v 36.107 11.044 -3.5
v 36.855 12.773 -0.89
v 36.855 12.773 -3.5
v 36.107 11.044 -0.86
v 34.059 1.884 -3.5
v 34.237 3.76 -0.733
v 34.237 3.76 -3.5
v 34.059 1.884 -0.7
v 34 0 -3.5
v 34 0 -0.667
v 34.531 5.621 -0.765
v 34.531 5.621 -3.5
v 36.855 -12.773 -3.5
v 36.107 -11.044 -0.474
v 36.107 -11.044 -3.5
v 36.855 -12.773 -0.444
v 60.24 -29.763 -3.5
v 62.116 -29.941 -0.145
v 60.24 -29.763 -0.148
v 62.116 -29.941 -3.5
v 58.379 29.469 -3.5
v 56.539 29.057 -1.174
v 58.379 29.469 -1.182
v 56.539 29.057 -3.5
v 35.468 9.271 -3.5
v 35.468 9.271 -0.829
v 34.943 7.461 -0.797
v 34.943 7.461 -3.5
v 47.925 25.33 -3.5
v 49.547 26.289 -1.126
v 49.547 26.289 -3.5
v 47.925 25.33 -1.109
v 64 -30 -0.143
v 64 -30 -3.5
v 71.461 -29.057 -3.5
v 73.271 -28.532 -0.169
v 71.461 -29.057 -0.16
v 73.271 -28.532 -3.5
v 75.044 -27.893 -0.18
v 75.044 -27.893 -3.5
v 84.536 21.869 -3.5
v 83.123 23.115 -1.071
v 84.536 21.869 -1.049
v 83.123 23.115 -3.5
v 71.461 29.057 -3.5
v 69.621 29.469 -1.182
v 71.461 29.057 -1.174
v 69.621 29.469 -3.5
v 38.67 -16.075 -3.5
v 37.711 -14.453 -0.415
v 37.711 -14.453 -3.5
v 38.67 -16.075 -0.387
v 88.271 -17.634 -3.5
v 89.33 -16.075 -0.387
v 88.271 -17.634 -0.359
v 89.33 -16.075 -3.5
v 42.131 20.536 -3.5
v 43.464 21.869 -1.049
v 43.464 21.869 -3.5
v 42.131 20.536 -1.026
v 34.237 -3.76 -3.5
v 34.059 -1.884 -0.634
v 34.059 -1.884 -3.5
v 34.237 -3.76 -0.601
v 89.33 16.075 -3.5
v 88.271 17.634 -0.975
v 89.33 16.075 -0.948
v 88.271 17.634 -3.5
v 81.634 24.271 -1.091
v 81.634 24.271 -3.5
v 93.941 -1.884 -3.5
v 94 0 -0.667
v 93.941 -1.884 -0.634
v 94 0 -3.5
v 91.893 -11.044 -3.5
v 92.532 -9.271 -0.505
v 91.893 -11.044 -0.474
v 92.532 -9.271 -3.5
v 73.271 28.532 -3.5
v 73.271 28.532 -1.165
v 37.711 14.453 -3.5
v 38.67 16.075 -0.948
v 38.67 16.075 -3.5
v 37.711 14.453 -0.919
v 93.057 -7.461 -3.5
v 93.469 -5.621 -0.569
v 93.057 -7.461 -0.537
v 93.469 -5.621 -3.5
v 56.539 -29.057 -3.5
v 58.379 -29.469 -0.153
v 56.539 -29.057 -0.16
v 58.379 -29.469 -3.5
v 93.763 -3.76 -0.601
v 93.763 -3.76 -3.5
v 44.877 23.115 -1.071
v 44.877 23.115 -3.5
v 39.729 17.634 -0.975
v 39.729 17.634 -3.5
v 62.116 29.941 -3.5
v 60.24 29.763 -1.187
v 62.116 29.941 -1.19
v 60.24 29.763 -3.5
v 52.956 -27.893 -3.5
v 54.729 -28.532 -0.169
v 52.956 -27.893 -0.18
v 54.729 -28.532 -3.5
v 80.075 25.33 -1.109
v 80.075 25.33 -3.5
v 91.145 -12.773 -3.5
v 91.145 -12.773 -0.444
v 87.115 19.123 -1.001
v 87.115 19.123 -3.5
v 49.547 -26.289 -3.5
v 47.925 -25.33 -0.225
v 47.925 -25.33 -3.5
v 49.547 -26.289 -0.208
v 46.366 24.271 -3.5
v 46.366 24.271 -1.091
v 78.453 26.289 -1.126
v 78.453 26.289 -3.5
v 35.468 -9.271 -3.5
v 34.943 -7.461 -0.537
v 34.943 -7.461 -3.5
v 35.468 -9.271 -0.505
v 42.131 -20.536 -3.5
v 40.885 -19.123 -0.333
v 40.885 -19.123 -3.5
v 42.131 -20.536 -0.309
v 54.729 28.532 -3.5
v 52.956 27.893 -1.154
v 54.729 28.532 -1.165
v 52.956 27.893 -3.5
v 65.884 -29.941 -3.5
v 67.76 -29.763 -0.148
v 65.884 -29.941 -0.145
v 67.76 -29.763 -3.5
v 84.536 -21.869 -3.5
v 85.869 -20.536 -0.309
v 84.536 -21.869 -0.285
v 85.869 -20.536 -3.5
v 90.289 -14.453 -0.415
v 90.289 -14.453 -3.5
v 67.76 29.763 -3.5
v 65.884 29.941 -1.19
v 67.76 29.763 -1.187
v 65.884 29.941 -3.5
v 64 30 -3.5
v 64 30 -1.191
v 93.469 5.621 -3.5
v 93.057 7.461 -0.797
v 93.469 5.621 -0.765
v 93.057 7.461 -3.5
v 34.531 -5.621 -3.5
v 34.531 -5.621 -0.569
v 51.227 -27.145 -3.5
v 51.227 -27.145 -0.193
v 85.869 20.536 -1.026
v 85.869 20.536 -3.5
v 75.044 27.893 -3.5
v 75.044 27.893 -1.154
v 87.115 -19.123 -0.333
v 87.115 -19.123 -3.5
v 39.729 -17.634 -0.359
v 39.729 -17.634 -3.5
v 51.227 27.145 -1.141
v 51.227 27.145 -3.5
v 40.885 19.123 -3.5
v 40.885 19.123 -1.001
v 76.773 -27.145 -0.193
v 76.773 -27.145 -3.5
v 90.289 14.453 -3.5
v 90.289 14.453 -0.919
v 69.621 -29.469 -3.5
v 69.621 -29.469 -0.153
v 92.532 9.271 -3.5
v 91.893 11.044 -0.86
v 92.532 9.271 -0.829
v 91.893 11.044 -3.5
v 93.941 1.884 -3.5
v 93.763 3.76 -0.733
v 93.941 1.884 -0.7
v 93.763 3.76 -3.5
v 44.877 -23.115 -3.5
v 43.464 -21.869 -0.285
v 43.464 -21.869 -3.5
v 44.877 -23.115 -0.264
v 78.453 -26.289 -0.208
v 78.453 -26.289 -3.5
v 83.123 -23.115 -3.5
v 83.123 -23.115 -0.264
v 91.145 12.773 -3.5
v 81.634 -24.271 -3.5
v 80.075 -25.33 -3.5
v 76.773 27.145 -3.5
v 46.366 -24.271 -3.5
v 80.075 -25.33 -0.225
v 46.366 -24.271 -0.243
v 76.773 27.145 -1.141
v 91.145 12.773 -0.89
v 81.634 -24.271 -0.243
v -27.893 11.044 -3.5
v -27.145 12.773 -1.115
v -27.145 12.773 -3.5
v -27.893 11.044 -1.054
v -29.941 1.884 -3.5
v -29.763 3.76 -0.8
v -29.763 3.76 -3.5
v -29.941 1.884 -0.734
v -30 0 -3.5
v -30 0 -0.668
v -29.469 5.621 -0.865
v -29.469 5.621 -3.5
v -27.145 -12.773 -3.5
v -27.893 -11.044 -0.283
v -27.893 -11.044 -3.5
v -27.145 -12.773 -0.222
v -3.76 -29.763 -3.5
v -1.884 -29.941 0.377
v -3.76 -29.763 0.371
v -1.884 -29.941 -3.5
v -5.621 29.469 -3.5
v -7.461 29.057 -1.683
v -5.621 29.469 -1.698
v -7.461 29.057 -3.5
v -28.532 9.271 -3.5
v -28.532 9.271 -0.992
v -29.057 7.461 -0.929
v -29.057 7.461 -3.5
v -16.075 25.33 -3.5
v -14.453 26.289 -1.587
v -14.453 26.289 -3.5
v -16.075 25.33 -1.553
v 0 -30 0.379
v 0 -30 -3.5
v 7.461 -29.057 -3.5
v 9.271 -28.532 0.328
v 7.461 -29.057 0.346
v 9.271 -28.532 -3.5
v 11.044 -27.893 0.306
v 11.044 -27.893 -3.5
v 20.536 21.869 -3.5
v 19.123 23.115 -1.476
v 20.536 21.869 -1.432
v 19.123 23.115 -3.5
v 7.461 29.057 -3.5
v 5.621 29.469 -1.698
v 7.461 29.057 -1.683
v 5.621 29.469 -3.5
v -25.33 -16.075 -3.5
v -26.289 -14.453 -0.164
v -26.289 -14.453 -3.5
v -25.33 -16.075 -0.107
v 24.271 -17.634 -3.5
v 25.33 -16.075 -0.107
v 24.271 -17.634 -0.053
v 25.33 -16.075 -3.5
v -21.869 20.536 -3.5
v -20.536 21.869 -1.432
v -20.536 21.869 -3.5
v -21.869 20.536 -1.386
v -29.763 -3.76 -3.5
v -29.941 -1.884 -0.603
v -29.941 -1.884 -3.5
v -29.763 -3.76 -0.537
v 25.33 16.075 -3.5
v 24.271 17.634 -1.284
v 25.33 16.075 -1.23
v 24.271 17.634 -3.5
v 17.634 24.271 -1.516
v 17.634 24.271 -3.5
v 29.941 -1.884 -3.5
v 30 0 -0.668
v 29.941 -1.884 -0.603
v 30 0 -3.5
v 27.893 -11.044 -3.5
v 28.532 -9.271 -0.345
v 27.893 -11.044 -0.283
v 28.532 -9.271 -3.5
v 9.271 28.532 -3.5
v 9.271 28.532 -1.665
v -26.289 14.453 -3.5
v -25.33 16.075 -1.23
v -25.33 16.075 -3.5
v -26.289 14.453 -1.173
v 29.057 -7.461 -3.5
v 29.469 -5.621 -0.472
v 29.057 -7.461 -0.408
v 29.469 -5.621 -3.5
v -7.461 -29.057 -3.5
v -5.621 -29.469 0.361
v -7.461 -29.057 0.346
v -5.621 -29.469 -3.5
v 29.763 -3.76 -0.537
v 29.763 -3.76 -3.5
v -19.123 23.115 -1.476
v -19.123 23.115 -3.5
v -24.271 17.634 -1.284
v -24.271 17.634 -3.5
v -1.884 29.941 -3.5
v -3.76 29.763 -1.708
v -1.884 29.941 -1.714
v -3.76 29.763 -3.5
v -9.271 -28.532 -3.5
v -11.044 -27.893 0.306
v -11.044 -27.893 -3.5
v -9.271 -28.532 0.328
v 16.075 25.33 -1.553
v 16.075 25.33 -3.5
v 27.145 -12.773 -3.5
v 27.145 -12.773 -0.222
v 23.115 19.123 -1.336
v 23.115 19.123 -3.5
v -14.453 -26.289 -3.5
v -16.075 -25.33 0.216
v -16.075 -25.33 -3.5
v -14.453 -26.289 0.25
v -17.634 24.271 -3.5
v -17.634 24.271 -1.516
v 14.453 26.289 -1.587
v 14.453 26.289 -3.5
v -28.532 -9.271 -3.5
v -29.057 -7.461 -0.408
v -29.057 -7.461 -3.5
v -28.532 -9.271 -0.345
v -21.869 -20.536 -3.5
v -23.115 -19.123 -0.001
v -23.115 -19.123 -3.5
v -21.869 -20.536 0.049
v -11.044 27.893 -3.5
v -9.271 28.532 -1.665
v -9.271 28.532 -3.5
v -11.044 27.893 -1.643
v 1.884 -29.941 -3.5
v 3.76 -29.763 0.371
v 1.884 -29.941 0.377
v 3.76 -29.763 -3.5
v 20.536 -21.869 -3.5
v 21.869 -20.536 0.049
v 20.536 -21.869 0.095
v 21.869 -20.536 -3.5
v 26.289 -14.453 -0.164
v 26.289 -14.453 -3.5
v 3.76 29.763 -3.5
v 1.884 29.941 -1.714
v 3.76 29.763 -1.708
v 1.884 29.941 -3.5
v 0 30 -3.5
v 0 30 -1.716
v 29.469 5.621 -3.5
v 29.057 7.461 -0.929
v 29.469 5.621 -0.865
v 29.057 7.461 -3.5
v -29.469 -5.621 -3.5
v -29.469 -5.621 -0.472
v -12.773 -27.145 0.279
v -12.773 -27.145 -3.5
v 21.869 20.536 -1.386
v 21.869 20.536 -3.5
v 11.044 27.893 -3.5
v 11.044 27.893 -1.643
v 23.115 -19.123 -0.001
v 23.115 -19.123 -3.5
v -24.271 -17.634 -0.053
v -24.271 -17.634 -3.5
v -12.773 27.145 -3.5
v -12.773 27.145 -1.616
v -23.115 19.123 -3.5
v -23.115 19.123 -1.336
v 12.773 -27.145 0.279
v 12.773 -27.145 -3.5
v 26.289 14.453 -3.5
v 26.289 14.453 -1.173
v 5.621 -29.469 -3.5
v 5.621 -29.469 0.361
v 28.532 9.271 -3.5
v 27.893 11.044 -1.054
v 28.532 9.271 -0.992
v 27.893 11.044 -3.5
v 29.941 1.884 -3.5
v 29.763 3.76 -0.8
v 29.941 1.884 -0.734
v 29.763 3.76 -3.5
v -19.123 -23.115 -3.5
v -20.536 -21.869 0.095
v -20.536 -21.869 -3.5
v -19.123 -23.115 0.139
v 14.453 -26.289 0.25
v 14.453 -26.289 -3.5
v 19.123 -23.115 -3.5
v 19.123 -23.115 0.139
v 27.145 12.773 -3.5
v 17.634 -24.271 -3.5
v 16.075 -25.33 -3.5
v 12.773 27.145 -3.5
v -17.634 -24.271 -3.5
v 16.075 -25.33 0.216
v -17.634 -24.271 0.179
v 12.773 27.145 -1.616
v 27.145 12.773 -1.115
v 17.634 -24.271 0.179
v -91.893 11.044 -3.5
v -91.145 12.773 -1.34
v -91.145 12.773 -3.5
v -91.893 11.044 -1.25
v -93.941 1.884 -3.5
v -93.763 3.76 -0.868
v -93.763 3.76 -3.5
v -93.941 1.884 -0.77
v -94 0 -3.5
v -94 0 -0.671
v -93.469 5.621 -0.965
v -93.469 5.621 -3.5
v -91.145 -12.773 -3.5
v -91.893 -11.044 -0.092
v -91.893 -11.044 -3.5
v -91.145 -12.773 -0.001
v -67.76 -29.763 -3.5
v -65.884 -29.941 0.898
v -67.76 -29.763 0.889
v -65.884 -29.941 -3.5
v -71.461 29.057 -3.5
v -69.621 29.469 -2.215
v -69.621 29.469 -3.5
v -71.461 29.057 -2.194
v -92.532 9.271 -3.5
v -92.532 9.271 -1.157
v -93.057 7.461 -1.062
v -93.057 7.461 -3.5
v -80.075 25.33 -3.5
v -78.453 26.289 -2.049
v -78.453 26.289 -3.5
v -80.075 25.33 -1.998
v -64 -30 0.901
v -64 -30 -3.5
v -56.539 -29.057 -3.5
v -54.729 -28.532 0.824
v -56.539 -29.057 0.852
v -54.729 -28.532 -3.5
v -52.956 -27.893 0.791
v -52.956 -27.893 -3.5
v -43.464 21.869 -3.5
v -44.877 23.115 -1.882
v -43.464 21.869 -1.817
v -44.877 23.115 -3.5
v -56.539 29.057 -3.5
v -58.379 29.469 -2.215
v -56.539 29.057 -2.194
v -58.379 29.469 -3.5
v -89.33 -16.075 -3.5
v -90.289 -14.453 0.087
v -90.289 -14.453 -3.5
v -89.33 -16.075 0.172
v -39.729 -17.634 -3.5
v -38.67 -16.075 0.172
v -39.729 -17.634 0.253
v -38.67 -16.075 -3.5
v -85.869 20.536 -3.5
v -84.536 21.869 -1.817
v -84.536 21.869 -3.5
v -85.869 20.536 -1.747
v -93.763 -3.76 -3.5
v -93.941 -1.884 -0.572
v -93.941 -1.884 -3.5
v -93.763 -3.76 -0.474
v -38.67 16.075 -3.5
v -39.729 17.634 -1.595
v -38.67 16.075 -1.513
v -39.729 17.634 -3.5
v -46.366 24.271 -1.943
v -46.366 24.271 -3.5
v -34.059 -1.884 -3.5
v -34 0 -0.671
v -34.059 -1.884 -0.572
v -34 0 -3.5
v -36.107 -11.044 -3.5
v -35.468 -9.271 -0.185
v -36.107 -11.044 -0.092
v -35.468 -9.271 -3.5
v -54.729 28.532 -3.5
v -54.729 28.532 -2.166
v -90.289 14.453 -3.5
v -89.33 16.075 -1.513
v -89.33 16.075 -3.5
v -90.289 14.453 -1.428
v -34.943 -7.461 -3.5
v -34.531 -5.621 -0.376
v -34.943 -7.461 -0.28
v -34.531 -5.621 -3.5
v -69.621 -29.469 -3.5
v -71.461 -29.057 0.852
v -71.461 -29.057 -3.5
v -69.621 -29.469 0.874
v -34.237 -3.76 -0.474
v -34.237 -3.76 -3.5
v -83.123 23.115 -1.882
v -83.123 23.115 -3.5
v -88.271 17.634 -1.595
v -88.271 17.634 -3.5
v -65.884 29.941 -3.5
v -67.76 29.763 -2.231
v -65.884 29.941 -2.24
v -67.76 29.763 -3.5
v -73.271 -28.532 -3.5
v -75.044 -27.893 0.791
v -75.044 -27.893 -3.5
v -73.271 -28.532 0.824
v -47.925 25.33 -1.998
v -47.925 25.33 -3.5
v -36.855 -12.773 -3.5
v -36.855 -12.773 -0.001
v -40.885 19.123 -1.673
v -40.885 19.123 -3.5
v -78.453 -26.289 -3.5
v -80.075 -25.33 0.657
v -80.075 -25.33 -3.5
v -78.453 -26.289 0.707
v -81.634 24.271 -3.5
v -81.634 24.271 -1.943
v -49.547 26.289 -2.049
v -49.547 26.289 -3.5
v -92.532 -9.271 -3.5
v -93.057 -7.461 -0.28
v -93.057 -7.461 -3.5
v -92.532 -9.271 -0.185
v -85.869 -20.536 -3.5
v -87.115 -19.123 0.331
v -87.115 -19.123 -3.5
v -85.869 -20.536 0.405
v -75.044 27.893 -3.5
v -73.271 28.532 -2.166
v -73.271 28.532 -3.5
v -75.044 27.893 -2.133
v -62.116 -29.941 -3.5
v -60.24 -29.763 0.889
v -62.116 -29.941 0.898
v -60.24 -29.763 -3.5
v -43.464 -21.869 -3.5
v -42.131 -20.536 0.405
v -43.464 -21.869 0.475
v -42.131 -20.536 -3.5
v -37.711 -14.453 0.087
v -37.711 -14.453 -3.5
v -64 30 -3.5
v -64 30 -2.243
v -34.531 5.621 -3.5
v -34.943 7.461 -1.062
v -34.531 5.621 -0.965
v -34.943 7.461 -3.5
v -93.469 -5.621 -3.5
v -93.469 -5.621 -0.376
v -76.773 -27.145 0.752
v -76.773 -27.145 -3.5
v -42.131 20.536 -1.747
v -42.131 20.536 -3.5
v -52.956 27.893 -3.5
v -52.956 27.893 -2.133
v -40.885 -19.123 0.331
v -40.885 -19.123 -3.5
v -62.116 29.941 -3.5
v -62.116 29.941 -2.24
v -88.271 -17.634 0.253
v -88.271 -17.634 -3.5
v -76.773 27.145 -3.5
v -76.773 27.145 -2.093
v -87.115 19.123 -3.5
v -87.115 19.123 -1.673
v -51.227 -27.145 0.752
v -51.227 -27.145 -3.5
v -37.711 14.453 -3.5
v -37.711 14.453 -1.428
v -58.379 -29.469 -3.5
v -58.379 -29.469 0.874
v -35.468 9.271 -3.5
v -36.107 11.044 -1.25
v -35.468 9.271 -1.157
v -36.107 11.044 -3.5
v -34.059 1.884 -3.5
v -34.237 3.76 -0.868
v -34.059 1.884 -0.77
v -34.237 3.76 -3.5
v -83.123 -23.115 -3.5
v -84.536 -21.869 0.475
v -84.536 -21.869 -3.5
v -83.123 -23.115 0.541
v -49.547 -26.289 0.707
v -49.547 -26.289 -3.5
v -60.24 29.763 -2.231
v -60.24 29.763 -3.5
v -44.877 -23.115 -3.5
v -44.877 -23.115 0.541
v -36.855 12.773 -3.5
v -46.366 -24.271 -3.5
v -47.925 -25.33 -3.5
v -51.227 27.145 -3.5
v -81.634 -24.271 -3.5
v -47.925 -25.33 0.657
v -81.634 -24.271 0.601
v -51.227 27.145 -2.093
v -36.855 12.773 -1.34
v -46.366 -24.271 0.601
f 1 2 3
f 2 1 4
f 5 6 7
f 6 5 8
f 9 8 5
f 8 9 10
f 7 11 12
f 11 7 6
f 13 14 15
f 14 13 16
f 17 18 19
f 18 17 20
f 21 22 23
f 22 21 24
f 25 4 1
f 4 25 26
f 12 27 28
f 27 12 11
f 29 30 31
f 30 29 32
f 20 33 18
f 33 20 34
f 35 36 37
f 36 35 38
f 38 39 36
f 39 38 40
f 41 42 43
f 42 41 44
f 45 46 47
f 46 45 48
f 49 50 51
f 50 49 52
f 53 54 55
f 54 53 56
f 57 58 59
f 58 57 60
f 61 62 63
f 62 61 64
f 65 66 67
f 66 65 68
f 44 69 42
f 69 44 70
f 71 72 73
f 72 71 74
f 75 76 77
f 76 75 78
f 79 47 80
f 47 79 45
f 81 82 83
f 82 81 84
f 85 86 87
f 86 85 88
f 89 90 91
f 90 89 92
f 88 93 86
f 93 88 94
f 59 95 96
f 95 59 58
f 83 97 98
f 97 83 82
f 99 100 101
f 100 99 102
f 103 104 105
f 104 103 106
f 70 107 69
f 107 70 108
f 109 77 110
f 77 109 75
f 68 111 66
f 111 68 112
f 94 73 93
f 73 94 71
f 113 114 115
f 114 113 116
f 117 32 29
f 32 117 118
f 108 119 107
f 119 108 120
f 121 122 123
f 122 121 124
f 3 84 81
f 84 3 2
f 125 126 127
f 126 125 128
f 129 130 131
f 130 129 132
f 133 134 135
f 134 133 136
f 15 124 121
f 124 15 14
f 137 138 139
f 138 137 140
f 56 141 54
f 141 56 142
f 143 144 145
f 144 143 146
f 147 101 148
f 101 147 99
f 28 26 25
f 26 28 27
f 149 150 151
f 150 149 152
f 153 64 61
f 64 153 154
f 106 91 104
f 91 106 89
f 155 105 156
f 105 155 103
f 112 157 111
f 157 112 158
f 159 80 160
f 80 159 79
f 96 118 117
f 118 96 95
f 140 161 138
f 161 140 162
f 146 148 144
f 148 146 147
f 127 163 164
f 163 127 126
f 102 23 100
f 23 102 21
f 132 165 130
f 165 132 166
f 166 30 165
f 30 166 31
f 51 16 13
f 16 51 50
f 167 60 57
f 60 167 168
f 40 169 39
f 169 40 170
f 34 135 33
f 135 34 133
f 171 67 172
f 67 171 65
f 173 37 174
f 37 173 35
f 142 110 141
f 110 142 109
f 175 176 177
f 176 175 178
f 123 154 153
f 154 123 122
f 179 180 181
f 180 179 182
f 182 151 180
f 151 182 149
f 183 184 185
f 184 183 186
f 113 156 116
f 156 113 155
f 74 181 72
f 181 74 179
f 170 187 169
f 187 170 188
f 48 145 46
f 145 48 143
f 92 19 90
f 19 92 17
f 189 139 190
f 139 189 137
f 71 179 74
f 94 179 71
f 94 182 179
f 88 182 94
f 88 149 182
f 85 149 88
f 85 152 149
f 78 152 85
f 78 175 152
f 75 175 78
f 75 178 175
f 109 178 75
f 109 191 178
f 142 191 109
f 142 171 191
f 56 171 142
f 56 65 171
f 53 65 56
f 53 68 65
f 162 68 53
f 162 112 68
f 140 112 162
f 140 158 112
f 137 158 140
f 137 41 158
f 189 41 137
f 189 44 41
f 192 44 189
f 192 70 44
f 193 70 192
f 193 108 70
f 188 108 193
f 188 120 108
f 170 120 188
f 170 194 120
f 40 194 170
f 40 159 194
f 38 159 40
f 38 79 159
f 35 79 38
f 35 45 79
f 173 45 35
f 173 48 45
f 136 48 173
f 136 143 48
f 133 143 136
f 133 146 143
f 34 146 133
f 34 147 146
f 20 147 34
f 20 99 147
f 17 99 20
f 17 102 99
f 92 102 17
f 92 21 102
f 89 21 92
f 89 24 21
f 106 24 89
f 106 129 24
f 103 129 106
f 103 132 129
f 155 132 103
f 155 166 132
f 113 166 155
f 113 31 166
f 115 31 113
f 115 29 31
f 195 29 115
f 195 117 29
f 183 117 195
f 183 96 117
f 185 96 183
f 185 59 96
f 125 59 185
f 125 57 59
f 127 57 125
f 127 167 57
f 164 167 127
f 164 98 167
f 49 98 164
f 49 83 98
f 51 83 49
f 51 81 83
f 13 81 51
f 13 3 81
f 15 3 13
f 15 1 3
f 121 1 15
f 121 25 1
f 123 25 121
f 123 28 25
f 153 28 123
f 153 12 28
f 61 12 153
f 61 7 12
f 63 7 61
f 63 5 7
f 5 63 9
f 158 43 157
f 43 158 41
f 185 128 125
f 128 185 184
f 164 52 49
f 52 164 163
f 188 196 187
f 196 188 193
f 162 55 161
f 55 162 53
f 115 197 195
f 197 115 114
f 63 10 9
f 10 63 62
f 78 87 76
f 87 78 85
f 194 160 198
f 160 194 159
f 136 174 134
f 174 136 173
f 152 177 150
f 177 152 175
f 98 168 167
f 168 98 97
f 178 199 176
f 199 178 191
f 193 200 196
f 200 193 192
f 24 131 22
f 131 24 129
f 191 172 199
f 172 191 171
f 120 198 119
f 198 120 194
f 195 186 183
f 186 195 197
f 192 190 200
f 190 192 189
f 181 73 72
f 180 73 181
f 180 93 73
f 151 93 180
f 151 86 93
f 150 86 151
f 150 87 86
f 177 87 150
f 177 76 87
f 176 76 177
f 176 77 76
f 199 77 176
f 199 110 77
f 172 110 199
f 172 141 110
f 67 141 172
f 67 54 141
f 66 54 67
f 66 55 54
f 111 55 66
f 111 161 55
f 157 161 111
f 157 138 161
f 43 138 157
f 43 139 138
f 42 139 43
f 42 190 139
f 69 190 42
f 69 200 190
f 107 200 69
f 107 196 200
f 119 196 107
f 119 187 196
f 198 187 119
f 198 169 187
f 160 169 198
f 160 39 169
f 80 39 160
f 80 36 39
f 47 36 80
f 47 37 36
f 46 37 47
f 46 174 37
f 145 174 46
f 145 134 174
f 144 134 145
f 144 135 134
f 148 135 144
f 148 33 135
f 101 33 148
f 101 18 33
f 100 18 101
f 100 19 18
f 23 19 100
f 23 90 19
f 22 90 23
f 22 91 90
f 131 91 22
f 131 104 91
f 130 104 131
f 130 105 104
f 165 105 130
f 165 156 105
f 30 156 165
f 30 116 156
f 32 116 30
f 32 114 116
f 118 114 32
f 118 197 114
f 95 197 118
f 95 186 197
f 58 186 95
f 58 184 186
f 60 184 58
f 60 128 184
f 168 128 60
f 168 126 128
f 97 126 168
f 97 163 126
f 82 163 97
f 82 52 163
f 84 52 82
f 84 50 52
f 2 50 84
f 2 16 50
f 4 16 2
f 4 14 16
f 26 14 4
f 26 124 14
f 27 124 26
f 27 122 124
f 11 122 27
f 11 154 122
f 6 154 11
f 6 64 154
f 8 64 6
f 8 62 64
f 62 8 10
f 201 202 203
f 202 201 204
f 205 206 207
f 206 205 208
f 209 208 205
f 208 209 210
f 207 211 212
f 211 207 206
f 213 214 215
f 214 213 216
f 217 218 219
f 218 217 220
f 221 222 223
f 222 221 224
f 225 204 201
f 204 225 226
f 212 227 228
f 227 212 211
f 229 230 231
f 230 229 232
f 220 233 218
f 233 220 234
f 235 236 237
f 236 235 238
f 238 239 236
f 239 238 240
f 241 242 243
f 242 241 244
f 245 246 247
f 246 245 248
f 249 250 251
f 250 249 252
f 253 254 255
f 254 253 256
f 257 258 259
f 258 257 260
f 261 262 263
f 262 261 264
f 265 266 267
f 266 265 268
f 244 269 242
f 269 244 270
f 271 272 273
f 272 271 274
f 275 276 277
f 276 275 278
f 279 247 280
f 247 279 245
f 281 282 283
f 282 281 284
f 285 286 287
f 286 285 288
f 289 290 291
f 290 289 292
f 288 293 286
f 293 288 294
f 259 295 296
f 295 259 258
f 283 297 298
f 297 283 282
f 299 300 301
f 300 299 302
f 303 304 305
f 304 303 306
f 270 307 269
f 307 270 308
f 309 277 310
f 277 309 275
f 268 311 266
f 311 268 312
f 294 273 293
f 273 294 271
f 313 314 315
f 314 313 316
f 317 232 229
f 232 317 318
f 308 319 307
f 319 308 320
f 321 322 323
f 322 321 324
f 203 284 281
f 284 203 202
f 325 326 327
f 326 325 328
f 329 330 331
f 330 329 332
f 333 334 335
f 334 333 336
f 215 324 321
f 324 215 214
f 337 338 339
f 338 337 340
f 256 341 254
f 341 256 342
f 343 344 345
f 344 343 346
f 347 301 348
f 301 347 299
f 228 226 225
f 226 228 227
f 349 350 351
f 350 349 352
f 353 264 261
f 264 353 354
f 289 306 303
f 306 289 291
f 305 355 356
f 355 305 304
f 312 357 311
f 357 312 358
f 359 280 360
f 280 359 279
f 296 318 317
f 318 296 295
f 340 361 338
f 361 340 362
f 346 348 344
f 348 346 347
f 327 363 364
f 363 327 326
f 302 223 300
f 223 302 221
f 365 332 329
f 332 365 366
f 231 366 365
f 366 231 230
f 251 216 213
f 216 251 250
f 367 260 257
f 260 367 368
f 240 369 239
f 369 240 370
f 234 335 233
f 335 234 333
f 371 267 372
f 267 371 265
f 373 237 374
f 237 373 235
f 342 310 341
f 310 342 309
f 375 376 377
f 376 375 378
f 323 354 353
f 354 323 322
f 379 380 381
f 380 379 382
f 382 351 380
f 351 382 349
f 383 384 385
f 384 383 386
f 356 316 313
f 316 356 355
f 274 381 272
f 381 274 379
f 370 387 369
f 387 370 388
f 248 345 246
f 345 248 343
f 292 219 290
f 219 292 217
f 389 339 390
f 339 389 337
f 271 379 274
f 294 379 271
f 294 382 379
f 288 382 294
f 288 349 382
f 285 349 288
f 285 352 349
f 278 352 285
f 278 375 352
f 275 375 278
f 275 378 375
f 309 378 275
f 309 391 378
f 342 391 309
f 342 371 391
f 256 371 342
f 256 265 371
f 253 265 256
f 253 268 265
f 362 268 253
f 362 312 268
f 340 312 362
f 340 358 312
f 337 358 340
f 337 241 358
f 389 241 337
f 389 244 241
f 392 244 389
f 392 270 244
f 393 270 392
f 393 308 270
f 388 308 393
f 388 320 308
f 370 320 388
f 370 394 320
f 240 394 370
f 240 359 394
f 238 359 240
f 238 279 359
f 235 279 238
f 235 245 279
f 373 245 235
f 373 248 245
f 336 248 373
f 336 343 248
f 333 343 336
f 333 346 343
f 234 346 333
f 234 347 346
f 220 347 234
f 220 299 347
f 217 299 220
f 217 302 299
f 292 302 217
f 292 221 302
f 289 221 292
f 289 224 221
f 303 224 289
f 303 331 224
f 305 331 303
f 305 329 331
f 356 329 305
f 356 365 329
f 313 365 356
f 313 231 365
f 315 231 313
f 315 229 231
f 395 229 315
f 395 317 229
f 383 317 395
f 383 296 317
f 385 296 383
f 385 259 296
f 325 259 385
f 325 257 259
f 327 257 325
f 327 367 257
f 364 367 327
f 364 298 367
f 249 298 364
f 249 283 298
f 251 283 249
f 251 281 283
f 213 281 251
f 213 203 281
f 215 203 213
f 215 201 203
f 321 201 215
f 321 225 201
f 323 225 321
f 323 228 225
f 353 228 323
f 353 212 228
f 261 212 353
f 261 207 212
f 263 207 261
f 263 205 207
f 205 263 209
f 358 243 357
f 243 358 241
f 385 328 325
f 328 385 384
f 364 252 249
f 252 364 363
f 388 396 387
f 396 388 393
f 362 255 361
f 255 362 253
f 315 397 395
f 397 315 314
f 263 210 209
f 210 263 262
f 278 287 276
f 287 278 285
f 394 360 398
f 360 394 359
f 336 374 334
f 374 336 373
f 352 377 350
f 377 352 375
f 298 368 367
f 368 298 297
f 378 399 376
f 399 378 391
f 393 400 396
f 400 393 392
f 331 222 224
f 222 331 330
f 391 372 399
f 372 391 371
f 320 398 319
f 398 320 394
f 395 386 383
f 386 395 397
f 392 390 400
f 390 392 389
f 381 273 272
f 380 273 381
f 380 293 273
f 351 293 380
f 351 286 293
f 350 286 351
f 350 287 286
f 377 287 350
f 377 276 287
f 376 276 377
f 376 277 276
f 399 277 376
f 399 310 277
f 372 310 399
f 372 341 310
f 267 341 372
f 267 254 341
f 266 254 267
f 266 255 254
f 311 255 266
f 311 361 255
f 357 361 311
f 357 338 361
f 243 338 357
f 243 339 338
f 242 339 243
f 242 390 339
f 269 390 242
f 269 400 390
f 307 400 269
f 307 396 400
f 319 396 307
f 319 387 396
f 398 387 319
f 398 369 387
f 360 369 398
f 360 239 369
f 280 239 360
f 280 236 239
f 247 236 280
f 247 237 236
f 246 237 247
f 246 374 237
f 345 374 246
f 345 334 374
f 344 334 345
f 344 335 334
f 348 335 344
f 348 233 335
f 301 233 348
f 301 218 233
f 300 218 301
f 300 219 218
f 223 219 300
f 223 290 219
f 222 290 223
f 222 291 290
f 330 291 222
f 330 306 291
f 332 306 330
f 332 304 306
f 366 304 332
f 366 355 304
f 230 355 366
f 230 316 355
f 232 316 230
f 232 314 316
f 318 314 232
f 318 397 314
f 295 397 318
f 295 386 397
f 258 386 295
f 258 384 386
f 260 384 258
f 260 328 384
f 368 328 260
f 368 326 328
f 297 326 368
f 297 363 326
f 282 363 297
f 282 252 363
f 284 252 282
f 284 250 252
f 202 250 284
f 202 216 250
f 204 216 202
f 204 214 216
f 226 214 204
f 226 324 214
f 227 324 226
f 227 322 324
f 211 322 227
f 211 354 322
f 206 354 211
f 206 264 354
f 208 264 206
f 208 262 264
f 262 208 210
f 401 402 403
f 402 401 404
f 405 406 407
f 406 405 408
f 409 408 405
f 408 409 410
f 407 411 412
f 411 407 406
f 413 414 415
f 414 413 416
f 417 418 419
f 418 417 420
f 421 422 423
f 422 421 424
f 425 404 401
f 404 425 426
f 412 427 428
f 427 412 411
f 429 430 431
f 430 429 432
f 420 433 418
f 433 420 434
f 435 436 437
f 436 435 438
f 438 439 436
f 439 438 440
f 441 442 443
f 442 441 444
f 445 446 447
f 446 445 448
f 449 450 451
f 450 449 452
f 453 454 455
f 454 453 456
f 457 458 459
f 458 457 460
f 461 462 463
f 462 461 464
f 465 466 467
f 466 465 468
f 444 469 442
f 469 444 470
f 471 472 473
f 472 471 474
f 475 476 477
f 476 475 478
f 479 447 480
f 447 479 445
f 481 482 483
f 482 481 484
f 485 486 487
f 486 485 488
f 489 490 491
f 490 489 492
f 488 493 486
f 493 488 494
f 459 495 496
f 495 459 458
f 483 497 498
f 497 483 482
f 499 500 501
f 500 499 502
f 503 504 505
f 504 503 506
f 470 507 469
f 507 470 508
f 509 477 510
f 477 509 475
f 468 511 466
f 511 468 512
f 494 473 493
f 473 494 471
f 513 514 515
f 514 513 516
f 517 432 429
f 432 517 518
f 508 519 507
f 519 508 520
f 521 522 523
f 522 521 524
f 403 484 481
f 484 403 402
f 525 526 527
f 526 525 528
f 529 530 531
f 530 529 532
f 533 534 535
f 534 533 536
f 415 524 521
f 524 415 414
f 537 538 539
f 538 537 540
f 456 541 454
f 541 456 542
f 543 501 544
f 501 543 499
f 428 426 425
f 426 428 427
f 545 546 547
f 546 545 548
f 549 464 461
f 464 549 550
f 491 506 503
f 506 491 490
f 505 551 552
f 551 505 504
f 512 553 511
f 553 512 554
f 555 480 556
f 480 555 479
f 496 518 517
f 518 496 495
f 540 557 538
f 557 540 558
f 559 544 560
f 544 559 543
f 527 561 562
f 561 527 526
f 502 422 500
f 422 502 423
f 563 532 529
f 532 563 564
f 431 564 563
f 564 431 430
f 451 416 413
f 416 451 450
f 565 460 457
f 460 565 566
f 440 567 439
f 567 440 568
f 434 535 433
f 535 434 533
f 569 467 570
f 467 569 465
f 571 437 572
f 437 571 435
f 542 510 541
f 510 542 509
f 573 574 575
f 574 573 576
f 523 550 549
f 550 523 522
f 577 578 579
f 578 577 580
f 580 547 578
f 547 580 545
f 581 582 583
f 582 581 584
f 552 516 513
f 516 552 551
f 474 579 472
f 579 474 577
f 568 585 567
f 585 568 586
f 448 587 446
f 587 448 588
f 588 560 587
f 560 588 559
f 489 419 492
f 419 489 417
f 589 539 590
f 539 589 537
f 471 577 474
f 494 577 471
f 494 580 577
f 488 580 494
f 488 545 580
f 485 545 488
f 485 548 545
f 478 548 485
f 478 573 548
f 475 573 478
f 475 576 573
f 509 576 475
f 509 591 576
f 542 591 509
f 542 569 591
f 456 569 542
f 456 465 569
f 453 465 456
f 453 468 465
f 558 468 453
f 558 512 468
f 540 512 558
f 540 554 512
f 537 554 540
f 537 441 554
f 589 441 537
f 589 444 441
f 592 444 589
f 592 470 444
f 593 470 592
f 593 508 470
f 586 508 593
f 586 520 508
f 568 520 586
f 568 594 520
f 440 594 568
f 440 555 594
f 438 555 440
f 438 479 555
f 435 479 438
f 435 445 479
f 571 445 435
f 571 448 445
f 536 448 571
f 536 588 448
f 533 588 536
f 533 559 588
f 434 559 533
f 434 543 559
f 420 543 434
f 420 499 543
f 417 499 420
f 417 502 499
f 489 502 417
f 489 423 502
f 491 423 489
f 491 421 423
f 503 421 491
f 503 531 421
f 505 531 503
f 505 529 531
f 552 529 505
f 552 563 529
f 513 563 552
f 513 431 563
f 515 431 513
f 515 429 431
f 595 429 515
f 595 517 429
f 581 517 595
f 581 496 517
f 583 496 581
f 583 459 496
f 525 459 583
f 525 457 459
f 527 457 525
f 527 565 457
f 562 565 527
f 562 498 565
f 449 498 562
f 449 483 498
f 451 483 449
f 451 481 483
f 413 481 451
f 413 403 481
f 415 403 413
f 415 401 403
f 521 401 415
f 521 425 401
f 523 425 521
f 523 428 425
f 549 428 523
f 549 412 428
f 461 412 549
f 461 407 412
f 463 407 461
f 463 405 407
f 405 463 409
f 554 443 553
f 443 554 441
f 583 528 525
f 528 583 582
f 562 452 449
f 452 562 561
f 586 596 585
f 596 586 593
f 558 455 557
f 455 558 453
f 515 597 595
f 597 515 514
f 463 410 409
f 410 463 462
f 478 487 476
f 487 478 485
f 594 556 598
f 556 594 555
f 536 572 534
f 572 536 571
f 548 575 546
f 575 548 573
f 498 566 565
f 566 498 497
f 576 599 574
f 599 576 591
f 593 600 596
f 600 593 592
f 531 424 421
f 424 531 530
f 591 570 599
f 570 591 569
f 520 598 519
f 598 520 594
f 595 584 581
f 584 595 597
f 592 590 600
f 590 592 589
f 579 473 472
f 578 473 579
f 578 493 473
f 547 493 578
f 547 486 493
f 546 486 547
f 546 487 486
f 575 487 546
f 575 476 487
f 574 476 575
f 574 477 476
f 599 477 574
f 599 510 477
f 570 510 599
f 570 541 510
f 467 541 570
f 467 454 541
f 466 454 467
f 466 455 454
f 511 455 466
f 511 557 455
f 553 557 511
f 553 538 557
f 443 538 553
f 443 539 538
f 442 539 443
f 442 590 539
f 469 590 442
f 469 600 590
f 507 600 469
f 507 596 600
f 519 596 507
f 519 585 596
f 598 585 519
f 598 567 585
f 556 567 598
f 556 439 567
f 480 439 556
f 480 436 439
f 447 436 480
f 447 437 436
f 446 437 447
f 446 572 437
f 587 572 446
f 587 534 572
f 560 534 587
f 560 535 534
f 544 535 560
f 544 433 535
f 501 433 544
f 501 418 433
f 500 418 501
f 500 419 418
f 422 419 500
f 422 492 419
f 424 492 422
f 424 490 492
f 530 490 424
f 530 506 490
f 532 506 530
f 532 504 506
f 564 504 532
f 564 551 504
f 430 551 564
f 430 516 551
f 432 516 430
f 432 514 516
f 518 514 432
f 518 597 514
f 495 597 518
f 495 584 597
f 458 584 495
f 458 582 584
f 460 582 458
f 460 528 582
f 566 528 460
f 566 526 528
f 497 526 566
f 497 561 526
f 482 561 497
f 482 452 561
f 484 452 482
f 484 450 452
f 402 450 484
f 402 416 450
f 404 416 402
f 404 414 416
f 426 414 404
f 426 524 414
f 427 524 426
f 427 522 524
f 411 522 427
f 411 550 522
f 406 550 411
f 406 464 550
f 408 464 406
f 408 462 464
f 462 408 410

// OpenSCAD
$fn = 100;

level_radius = 30;
level_height = 7;
cutoff_side = level_radius * 2.1;

module level(angle) {
    difference() {
        cylinder(h = level_height, r = level_radius, center = true);
        translate([0, 0, -level_height/3]) {
            rotate([angle, 0, 0]) {
                cube([cutoff_side, cutoff_side, 6], center = true);
            }
        }
    }
}

increment = level_radius*2+4;


rotate([0, 180, 0]) {
    translate([-increment, 0, 0]) level(1);
    translate([0, 0, 0]) level(2);
    translate([increment, 0, 0]) level(3);
}
